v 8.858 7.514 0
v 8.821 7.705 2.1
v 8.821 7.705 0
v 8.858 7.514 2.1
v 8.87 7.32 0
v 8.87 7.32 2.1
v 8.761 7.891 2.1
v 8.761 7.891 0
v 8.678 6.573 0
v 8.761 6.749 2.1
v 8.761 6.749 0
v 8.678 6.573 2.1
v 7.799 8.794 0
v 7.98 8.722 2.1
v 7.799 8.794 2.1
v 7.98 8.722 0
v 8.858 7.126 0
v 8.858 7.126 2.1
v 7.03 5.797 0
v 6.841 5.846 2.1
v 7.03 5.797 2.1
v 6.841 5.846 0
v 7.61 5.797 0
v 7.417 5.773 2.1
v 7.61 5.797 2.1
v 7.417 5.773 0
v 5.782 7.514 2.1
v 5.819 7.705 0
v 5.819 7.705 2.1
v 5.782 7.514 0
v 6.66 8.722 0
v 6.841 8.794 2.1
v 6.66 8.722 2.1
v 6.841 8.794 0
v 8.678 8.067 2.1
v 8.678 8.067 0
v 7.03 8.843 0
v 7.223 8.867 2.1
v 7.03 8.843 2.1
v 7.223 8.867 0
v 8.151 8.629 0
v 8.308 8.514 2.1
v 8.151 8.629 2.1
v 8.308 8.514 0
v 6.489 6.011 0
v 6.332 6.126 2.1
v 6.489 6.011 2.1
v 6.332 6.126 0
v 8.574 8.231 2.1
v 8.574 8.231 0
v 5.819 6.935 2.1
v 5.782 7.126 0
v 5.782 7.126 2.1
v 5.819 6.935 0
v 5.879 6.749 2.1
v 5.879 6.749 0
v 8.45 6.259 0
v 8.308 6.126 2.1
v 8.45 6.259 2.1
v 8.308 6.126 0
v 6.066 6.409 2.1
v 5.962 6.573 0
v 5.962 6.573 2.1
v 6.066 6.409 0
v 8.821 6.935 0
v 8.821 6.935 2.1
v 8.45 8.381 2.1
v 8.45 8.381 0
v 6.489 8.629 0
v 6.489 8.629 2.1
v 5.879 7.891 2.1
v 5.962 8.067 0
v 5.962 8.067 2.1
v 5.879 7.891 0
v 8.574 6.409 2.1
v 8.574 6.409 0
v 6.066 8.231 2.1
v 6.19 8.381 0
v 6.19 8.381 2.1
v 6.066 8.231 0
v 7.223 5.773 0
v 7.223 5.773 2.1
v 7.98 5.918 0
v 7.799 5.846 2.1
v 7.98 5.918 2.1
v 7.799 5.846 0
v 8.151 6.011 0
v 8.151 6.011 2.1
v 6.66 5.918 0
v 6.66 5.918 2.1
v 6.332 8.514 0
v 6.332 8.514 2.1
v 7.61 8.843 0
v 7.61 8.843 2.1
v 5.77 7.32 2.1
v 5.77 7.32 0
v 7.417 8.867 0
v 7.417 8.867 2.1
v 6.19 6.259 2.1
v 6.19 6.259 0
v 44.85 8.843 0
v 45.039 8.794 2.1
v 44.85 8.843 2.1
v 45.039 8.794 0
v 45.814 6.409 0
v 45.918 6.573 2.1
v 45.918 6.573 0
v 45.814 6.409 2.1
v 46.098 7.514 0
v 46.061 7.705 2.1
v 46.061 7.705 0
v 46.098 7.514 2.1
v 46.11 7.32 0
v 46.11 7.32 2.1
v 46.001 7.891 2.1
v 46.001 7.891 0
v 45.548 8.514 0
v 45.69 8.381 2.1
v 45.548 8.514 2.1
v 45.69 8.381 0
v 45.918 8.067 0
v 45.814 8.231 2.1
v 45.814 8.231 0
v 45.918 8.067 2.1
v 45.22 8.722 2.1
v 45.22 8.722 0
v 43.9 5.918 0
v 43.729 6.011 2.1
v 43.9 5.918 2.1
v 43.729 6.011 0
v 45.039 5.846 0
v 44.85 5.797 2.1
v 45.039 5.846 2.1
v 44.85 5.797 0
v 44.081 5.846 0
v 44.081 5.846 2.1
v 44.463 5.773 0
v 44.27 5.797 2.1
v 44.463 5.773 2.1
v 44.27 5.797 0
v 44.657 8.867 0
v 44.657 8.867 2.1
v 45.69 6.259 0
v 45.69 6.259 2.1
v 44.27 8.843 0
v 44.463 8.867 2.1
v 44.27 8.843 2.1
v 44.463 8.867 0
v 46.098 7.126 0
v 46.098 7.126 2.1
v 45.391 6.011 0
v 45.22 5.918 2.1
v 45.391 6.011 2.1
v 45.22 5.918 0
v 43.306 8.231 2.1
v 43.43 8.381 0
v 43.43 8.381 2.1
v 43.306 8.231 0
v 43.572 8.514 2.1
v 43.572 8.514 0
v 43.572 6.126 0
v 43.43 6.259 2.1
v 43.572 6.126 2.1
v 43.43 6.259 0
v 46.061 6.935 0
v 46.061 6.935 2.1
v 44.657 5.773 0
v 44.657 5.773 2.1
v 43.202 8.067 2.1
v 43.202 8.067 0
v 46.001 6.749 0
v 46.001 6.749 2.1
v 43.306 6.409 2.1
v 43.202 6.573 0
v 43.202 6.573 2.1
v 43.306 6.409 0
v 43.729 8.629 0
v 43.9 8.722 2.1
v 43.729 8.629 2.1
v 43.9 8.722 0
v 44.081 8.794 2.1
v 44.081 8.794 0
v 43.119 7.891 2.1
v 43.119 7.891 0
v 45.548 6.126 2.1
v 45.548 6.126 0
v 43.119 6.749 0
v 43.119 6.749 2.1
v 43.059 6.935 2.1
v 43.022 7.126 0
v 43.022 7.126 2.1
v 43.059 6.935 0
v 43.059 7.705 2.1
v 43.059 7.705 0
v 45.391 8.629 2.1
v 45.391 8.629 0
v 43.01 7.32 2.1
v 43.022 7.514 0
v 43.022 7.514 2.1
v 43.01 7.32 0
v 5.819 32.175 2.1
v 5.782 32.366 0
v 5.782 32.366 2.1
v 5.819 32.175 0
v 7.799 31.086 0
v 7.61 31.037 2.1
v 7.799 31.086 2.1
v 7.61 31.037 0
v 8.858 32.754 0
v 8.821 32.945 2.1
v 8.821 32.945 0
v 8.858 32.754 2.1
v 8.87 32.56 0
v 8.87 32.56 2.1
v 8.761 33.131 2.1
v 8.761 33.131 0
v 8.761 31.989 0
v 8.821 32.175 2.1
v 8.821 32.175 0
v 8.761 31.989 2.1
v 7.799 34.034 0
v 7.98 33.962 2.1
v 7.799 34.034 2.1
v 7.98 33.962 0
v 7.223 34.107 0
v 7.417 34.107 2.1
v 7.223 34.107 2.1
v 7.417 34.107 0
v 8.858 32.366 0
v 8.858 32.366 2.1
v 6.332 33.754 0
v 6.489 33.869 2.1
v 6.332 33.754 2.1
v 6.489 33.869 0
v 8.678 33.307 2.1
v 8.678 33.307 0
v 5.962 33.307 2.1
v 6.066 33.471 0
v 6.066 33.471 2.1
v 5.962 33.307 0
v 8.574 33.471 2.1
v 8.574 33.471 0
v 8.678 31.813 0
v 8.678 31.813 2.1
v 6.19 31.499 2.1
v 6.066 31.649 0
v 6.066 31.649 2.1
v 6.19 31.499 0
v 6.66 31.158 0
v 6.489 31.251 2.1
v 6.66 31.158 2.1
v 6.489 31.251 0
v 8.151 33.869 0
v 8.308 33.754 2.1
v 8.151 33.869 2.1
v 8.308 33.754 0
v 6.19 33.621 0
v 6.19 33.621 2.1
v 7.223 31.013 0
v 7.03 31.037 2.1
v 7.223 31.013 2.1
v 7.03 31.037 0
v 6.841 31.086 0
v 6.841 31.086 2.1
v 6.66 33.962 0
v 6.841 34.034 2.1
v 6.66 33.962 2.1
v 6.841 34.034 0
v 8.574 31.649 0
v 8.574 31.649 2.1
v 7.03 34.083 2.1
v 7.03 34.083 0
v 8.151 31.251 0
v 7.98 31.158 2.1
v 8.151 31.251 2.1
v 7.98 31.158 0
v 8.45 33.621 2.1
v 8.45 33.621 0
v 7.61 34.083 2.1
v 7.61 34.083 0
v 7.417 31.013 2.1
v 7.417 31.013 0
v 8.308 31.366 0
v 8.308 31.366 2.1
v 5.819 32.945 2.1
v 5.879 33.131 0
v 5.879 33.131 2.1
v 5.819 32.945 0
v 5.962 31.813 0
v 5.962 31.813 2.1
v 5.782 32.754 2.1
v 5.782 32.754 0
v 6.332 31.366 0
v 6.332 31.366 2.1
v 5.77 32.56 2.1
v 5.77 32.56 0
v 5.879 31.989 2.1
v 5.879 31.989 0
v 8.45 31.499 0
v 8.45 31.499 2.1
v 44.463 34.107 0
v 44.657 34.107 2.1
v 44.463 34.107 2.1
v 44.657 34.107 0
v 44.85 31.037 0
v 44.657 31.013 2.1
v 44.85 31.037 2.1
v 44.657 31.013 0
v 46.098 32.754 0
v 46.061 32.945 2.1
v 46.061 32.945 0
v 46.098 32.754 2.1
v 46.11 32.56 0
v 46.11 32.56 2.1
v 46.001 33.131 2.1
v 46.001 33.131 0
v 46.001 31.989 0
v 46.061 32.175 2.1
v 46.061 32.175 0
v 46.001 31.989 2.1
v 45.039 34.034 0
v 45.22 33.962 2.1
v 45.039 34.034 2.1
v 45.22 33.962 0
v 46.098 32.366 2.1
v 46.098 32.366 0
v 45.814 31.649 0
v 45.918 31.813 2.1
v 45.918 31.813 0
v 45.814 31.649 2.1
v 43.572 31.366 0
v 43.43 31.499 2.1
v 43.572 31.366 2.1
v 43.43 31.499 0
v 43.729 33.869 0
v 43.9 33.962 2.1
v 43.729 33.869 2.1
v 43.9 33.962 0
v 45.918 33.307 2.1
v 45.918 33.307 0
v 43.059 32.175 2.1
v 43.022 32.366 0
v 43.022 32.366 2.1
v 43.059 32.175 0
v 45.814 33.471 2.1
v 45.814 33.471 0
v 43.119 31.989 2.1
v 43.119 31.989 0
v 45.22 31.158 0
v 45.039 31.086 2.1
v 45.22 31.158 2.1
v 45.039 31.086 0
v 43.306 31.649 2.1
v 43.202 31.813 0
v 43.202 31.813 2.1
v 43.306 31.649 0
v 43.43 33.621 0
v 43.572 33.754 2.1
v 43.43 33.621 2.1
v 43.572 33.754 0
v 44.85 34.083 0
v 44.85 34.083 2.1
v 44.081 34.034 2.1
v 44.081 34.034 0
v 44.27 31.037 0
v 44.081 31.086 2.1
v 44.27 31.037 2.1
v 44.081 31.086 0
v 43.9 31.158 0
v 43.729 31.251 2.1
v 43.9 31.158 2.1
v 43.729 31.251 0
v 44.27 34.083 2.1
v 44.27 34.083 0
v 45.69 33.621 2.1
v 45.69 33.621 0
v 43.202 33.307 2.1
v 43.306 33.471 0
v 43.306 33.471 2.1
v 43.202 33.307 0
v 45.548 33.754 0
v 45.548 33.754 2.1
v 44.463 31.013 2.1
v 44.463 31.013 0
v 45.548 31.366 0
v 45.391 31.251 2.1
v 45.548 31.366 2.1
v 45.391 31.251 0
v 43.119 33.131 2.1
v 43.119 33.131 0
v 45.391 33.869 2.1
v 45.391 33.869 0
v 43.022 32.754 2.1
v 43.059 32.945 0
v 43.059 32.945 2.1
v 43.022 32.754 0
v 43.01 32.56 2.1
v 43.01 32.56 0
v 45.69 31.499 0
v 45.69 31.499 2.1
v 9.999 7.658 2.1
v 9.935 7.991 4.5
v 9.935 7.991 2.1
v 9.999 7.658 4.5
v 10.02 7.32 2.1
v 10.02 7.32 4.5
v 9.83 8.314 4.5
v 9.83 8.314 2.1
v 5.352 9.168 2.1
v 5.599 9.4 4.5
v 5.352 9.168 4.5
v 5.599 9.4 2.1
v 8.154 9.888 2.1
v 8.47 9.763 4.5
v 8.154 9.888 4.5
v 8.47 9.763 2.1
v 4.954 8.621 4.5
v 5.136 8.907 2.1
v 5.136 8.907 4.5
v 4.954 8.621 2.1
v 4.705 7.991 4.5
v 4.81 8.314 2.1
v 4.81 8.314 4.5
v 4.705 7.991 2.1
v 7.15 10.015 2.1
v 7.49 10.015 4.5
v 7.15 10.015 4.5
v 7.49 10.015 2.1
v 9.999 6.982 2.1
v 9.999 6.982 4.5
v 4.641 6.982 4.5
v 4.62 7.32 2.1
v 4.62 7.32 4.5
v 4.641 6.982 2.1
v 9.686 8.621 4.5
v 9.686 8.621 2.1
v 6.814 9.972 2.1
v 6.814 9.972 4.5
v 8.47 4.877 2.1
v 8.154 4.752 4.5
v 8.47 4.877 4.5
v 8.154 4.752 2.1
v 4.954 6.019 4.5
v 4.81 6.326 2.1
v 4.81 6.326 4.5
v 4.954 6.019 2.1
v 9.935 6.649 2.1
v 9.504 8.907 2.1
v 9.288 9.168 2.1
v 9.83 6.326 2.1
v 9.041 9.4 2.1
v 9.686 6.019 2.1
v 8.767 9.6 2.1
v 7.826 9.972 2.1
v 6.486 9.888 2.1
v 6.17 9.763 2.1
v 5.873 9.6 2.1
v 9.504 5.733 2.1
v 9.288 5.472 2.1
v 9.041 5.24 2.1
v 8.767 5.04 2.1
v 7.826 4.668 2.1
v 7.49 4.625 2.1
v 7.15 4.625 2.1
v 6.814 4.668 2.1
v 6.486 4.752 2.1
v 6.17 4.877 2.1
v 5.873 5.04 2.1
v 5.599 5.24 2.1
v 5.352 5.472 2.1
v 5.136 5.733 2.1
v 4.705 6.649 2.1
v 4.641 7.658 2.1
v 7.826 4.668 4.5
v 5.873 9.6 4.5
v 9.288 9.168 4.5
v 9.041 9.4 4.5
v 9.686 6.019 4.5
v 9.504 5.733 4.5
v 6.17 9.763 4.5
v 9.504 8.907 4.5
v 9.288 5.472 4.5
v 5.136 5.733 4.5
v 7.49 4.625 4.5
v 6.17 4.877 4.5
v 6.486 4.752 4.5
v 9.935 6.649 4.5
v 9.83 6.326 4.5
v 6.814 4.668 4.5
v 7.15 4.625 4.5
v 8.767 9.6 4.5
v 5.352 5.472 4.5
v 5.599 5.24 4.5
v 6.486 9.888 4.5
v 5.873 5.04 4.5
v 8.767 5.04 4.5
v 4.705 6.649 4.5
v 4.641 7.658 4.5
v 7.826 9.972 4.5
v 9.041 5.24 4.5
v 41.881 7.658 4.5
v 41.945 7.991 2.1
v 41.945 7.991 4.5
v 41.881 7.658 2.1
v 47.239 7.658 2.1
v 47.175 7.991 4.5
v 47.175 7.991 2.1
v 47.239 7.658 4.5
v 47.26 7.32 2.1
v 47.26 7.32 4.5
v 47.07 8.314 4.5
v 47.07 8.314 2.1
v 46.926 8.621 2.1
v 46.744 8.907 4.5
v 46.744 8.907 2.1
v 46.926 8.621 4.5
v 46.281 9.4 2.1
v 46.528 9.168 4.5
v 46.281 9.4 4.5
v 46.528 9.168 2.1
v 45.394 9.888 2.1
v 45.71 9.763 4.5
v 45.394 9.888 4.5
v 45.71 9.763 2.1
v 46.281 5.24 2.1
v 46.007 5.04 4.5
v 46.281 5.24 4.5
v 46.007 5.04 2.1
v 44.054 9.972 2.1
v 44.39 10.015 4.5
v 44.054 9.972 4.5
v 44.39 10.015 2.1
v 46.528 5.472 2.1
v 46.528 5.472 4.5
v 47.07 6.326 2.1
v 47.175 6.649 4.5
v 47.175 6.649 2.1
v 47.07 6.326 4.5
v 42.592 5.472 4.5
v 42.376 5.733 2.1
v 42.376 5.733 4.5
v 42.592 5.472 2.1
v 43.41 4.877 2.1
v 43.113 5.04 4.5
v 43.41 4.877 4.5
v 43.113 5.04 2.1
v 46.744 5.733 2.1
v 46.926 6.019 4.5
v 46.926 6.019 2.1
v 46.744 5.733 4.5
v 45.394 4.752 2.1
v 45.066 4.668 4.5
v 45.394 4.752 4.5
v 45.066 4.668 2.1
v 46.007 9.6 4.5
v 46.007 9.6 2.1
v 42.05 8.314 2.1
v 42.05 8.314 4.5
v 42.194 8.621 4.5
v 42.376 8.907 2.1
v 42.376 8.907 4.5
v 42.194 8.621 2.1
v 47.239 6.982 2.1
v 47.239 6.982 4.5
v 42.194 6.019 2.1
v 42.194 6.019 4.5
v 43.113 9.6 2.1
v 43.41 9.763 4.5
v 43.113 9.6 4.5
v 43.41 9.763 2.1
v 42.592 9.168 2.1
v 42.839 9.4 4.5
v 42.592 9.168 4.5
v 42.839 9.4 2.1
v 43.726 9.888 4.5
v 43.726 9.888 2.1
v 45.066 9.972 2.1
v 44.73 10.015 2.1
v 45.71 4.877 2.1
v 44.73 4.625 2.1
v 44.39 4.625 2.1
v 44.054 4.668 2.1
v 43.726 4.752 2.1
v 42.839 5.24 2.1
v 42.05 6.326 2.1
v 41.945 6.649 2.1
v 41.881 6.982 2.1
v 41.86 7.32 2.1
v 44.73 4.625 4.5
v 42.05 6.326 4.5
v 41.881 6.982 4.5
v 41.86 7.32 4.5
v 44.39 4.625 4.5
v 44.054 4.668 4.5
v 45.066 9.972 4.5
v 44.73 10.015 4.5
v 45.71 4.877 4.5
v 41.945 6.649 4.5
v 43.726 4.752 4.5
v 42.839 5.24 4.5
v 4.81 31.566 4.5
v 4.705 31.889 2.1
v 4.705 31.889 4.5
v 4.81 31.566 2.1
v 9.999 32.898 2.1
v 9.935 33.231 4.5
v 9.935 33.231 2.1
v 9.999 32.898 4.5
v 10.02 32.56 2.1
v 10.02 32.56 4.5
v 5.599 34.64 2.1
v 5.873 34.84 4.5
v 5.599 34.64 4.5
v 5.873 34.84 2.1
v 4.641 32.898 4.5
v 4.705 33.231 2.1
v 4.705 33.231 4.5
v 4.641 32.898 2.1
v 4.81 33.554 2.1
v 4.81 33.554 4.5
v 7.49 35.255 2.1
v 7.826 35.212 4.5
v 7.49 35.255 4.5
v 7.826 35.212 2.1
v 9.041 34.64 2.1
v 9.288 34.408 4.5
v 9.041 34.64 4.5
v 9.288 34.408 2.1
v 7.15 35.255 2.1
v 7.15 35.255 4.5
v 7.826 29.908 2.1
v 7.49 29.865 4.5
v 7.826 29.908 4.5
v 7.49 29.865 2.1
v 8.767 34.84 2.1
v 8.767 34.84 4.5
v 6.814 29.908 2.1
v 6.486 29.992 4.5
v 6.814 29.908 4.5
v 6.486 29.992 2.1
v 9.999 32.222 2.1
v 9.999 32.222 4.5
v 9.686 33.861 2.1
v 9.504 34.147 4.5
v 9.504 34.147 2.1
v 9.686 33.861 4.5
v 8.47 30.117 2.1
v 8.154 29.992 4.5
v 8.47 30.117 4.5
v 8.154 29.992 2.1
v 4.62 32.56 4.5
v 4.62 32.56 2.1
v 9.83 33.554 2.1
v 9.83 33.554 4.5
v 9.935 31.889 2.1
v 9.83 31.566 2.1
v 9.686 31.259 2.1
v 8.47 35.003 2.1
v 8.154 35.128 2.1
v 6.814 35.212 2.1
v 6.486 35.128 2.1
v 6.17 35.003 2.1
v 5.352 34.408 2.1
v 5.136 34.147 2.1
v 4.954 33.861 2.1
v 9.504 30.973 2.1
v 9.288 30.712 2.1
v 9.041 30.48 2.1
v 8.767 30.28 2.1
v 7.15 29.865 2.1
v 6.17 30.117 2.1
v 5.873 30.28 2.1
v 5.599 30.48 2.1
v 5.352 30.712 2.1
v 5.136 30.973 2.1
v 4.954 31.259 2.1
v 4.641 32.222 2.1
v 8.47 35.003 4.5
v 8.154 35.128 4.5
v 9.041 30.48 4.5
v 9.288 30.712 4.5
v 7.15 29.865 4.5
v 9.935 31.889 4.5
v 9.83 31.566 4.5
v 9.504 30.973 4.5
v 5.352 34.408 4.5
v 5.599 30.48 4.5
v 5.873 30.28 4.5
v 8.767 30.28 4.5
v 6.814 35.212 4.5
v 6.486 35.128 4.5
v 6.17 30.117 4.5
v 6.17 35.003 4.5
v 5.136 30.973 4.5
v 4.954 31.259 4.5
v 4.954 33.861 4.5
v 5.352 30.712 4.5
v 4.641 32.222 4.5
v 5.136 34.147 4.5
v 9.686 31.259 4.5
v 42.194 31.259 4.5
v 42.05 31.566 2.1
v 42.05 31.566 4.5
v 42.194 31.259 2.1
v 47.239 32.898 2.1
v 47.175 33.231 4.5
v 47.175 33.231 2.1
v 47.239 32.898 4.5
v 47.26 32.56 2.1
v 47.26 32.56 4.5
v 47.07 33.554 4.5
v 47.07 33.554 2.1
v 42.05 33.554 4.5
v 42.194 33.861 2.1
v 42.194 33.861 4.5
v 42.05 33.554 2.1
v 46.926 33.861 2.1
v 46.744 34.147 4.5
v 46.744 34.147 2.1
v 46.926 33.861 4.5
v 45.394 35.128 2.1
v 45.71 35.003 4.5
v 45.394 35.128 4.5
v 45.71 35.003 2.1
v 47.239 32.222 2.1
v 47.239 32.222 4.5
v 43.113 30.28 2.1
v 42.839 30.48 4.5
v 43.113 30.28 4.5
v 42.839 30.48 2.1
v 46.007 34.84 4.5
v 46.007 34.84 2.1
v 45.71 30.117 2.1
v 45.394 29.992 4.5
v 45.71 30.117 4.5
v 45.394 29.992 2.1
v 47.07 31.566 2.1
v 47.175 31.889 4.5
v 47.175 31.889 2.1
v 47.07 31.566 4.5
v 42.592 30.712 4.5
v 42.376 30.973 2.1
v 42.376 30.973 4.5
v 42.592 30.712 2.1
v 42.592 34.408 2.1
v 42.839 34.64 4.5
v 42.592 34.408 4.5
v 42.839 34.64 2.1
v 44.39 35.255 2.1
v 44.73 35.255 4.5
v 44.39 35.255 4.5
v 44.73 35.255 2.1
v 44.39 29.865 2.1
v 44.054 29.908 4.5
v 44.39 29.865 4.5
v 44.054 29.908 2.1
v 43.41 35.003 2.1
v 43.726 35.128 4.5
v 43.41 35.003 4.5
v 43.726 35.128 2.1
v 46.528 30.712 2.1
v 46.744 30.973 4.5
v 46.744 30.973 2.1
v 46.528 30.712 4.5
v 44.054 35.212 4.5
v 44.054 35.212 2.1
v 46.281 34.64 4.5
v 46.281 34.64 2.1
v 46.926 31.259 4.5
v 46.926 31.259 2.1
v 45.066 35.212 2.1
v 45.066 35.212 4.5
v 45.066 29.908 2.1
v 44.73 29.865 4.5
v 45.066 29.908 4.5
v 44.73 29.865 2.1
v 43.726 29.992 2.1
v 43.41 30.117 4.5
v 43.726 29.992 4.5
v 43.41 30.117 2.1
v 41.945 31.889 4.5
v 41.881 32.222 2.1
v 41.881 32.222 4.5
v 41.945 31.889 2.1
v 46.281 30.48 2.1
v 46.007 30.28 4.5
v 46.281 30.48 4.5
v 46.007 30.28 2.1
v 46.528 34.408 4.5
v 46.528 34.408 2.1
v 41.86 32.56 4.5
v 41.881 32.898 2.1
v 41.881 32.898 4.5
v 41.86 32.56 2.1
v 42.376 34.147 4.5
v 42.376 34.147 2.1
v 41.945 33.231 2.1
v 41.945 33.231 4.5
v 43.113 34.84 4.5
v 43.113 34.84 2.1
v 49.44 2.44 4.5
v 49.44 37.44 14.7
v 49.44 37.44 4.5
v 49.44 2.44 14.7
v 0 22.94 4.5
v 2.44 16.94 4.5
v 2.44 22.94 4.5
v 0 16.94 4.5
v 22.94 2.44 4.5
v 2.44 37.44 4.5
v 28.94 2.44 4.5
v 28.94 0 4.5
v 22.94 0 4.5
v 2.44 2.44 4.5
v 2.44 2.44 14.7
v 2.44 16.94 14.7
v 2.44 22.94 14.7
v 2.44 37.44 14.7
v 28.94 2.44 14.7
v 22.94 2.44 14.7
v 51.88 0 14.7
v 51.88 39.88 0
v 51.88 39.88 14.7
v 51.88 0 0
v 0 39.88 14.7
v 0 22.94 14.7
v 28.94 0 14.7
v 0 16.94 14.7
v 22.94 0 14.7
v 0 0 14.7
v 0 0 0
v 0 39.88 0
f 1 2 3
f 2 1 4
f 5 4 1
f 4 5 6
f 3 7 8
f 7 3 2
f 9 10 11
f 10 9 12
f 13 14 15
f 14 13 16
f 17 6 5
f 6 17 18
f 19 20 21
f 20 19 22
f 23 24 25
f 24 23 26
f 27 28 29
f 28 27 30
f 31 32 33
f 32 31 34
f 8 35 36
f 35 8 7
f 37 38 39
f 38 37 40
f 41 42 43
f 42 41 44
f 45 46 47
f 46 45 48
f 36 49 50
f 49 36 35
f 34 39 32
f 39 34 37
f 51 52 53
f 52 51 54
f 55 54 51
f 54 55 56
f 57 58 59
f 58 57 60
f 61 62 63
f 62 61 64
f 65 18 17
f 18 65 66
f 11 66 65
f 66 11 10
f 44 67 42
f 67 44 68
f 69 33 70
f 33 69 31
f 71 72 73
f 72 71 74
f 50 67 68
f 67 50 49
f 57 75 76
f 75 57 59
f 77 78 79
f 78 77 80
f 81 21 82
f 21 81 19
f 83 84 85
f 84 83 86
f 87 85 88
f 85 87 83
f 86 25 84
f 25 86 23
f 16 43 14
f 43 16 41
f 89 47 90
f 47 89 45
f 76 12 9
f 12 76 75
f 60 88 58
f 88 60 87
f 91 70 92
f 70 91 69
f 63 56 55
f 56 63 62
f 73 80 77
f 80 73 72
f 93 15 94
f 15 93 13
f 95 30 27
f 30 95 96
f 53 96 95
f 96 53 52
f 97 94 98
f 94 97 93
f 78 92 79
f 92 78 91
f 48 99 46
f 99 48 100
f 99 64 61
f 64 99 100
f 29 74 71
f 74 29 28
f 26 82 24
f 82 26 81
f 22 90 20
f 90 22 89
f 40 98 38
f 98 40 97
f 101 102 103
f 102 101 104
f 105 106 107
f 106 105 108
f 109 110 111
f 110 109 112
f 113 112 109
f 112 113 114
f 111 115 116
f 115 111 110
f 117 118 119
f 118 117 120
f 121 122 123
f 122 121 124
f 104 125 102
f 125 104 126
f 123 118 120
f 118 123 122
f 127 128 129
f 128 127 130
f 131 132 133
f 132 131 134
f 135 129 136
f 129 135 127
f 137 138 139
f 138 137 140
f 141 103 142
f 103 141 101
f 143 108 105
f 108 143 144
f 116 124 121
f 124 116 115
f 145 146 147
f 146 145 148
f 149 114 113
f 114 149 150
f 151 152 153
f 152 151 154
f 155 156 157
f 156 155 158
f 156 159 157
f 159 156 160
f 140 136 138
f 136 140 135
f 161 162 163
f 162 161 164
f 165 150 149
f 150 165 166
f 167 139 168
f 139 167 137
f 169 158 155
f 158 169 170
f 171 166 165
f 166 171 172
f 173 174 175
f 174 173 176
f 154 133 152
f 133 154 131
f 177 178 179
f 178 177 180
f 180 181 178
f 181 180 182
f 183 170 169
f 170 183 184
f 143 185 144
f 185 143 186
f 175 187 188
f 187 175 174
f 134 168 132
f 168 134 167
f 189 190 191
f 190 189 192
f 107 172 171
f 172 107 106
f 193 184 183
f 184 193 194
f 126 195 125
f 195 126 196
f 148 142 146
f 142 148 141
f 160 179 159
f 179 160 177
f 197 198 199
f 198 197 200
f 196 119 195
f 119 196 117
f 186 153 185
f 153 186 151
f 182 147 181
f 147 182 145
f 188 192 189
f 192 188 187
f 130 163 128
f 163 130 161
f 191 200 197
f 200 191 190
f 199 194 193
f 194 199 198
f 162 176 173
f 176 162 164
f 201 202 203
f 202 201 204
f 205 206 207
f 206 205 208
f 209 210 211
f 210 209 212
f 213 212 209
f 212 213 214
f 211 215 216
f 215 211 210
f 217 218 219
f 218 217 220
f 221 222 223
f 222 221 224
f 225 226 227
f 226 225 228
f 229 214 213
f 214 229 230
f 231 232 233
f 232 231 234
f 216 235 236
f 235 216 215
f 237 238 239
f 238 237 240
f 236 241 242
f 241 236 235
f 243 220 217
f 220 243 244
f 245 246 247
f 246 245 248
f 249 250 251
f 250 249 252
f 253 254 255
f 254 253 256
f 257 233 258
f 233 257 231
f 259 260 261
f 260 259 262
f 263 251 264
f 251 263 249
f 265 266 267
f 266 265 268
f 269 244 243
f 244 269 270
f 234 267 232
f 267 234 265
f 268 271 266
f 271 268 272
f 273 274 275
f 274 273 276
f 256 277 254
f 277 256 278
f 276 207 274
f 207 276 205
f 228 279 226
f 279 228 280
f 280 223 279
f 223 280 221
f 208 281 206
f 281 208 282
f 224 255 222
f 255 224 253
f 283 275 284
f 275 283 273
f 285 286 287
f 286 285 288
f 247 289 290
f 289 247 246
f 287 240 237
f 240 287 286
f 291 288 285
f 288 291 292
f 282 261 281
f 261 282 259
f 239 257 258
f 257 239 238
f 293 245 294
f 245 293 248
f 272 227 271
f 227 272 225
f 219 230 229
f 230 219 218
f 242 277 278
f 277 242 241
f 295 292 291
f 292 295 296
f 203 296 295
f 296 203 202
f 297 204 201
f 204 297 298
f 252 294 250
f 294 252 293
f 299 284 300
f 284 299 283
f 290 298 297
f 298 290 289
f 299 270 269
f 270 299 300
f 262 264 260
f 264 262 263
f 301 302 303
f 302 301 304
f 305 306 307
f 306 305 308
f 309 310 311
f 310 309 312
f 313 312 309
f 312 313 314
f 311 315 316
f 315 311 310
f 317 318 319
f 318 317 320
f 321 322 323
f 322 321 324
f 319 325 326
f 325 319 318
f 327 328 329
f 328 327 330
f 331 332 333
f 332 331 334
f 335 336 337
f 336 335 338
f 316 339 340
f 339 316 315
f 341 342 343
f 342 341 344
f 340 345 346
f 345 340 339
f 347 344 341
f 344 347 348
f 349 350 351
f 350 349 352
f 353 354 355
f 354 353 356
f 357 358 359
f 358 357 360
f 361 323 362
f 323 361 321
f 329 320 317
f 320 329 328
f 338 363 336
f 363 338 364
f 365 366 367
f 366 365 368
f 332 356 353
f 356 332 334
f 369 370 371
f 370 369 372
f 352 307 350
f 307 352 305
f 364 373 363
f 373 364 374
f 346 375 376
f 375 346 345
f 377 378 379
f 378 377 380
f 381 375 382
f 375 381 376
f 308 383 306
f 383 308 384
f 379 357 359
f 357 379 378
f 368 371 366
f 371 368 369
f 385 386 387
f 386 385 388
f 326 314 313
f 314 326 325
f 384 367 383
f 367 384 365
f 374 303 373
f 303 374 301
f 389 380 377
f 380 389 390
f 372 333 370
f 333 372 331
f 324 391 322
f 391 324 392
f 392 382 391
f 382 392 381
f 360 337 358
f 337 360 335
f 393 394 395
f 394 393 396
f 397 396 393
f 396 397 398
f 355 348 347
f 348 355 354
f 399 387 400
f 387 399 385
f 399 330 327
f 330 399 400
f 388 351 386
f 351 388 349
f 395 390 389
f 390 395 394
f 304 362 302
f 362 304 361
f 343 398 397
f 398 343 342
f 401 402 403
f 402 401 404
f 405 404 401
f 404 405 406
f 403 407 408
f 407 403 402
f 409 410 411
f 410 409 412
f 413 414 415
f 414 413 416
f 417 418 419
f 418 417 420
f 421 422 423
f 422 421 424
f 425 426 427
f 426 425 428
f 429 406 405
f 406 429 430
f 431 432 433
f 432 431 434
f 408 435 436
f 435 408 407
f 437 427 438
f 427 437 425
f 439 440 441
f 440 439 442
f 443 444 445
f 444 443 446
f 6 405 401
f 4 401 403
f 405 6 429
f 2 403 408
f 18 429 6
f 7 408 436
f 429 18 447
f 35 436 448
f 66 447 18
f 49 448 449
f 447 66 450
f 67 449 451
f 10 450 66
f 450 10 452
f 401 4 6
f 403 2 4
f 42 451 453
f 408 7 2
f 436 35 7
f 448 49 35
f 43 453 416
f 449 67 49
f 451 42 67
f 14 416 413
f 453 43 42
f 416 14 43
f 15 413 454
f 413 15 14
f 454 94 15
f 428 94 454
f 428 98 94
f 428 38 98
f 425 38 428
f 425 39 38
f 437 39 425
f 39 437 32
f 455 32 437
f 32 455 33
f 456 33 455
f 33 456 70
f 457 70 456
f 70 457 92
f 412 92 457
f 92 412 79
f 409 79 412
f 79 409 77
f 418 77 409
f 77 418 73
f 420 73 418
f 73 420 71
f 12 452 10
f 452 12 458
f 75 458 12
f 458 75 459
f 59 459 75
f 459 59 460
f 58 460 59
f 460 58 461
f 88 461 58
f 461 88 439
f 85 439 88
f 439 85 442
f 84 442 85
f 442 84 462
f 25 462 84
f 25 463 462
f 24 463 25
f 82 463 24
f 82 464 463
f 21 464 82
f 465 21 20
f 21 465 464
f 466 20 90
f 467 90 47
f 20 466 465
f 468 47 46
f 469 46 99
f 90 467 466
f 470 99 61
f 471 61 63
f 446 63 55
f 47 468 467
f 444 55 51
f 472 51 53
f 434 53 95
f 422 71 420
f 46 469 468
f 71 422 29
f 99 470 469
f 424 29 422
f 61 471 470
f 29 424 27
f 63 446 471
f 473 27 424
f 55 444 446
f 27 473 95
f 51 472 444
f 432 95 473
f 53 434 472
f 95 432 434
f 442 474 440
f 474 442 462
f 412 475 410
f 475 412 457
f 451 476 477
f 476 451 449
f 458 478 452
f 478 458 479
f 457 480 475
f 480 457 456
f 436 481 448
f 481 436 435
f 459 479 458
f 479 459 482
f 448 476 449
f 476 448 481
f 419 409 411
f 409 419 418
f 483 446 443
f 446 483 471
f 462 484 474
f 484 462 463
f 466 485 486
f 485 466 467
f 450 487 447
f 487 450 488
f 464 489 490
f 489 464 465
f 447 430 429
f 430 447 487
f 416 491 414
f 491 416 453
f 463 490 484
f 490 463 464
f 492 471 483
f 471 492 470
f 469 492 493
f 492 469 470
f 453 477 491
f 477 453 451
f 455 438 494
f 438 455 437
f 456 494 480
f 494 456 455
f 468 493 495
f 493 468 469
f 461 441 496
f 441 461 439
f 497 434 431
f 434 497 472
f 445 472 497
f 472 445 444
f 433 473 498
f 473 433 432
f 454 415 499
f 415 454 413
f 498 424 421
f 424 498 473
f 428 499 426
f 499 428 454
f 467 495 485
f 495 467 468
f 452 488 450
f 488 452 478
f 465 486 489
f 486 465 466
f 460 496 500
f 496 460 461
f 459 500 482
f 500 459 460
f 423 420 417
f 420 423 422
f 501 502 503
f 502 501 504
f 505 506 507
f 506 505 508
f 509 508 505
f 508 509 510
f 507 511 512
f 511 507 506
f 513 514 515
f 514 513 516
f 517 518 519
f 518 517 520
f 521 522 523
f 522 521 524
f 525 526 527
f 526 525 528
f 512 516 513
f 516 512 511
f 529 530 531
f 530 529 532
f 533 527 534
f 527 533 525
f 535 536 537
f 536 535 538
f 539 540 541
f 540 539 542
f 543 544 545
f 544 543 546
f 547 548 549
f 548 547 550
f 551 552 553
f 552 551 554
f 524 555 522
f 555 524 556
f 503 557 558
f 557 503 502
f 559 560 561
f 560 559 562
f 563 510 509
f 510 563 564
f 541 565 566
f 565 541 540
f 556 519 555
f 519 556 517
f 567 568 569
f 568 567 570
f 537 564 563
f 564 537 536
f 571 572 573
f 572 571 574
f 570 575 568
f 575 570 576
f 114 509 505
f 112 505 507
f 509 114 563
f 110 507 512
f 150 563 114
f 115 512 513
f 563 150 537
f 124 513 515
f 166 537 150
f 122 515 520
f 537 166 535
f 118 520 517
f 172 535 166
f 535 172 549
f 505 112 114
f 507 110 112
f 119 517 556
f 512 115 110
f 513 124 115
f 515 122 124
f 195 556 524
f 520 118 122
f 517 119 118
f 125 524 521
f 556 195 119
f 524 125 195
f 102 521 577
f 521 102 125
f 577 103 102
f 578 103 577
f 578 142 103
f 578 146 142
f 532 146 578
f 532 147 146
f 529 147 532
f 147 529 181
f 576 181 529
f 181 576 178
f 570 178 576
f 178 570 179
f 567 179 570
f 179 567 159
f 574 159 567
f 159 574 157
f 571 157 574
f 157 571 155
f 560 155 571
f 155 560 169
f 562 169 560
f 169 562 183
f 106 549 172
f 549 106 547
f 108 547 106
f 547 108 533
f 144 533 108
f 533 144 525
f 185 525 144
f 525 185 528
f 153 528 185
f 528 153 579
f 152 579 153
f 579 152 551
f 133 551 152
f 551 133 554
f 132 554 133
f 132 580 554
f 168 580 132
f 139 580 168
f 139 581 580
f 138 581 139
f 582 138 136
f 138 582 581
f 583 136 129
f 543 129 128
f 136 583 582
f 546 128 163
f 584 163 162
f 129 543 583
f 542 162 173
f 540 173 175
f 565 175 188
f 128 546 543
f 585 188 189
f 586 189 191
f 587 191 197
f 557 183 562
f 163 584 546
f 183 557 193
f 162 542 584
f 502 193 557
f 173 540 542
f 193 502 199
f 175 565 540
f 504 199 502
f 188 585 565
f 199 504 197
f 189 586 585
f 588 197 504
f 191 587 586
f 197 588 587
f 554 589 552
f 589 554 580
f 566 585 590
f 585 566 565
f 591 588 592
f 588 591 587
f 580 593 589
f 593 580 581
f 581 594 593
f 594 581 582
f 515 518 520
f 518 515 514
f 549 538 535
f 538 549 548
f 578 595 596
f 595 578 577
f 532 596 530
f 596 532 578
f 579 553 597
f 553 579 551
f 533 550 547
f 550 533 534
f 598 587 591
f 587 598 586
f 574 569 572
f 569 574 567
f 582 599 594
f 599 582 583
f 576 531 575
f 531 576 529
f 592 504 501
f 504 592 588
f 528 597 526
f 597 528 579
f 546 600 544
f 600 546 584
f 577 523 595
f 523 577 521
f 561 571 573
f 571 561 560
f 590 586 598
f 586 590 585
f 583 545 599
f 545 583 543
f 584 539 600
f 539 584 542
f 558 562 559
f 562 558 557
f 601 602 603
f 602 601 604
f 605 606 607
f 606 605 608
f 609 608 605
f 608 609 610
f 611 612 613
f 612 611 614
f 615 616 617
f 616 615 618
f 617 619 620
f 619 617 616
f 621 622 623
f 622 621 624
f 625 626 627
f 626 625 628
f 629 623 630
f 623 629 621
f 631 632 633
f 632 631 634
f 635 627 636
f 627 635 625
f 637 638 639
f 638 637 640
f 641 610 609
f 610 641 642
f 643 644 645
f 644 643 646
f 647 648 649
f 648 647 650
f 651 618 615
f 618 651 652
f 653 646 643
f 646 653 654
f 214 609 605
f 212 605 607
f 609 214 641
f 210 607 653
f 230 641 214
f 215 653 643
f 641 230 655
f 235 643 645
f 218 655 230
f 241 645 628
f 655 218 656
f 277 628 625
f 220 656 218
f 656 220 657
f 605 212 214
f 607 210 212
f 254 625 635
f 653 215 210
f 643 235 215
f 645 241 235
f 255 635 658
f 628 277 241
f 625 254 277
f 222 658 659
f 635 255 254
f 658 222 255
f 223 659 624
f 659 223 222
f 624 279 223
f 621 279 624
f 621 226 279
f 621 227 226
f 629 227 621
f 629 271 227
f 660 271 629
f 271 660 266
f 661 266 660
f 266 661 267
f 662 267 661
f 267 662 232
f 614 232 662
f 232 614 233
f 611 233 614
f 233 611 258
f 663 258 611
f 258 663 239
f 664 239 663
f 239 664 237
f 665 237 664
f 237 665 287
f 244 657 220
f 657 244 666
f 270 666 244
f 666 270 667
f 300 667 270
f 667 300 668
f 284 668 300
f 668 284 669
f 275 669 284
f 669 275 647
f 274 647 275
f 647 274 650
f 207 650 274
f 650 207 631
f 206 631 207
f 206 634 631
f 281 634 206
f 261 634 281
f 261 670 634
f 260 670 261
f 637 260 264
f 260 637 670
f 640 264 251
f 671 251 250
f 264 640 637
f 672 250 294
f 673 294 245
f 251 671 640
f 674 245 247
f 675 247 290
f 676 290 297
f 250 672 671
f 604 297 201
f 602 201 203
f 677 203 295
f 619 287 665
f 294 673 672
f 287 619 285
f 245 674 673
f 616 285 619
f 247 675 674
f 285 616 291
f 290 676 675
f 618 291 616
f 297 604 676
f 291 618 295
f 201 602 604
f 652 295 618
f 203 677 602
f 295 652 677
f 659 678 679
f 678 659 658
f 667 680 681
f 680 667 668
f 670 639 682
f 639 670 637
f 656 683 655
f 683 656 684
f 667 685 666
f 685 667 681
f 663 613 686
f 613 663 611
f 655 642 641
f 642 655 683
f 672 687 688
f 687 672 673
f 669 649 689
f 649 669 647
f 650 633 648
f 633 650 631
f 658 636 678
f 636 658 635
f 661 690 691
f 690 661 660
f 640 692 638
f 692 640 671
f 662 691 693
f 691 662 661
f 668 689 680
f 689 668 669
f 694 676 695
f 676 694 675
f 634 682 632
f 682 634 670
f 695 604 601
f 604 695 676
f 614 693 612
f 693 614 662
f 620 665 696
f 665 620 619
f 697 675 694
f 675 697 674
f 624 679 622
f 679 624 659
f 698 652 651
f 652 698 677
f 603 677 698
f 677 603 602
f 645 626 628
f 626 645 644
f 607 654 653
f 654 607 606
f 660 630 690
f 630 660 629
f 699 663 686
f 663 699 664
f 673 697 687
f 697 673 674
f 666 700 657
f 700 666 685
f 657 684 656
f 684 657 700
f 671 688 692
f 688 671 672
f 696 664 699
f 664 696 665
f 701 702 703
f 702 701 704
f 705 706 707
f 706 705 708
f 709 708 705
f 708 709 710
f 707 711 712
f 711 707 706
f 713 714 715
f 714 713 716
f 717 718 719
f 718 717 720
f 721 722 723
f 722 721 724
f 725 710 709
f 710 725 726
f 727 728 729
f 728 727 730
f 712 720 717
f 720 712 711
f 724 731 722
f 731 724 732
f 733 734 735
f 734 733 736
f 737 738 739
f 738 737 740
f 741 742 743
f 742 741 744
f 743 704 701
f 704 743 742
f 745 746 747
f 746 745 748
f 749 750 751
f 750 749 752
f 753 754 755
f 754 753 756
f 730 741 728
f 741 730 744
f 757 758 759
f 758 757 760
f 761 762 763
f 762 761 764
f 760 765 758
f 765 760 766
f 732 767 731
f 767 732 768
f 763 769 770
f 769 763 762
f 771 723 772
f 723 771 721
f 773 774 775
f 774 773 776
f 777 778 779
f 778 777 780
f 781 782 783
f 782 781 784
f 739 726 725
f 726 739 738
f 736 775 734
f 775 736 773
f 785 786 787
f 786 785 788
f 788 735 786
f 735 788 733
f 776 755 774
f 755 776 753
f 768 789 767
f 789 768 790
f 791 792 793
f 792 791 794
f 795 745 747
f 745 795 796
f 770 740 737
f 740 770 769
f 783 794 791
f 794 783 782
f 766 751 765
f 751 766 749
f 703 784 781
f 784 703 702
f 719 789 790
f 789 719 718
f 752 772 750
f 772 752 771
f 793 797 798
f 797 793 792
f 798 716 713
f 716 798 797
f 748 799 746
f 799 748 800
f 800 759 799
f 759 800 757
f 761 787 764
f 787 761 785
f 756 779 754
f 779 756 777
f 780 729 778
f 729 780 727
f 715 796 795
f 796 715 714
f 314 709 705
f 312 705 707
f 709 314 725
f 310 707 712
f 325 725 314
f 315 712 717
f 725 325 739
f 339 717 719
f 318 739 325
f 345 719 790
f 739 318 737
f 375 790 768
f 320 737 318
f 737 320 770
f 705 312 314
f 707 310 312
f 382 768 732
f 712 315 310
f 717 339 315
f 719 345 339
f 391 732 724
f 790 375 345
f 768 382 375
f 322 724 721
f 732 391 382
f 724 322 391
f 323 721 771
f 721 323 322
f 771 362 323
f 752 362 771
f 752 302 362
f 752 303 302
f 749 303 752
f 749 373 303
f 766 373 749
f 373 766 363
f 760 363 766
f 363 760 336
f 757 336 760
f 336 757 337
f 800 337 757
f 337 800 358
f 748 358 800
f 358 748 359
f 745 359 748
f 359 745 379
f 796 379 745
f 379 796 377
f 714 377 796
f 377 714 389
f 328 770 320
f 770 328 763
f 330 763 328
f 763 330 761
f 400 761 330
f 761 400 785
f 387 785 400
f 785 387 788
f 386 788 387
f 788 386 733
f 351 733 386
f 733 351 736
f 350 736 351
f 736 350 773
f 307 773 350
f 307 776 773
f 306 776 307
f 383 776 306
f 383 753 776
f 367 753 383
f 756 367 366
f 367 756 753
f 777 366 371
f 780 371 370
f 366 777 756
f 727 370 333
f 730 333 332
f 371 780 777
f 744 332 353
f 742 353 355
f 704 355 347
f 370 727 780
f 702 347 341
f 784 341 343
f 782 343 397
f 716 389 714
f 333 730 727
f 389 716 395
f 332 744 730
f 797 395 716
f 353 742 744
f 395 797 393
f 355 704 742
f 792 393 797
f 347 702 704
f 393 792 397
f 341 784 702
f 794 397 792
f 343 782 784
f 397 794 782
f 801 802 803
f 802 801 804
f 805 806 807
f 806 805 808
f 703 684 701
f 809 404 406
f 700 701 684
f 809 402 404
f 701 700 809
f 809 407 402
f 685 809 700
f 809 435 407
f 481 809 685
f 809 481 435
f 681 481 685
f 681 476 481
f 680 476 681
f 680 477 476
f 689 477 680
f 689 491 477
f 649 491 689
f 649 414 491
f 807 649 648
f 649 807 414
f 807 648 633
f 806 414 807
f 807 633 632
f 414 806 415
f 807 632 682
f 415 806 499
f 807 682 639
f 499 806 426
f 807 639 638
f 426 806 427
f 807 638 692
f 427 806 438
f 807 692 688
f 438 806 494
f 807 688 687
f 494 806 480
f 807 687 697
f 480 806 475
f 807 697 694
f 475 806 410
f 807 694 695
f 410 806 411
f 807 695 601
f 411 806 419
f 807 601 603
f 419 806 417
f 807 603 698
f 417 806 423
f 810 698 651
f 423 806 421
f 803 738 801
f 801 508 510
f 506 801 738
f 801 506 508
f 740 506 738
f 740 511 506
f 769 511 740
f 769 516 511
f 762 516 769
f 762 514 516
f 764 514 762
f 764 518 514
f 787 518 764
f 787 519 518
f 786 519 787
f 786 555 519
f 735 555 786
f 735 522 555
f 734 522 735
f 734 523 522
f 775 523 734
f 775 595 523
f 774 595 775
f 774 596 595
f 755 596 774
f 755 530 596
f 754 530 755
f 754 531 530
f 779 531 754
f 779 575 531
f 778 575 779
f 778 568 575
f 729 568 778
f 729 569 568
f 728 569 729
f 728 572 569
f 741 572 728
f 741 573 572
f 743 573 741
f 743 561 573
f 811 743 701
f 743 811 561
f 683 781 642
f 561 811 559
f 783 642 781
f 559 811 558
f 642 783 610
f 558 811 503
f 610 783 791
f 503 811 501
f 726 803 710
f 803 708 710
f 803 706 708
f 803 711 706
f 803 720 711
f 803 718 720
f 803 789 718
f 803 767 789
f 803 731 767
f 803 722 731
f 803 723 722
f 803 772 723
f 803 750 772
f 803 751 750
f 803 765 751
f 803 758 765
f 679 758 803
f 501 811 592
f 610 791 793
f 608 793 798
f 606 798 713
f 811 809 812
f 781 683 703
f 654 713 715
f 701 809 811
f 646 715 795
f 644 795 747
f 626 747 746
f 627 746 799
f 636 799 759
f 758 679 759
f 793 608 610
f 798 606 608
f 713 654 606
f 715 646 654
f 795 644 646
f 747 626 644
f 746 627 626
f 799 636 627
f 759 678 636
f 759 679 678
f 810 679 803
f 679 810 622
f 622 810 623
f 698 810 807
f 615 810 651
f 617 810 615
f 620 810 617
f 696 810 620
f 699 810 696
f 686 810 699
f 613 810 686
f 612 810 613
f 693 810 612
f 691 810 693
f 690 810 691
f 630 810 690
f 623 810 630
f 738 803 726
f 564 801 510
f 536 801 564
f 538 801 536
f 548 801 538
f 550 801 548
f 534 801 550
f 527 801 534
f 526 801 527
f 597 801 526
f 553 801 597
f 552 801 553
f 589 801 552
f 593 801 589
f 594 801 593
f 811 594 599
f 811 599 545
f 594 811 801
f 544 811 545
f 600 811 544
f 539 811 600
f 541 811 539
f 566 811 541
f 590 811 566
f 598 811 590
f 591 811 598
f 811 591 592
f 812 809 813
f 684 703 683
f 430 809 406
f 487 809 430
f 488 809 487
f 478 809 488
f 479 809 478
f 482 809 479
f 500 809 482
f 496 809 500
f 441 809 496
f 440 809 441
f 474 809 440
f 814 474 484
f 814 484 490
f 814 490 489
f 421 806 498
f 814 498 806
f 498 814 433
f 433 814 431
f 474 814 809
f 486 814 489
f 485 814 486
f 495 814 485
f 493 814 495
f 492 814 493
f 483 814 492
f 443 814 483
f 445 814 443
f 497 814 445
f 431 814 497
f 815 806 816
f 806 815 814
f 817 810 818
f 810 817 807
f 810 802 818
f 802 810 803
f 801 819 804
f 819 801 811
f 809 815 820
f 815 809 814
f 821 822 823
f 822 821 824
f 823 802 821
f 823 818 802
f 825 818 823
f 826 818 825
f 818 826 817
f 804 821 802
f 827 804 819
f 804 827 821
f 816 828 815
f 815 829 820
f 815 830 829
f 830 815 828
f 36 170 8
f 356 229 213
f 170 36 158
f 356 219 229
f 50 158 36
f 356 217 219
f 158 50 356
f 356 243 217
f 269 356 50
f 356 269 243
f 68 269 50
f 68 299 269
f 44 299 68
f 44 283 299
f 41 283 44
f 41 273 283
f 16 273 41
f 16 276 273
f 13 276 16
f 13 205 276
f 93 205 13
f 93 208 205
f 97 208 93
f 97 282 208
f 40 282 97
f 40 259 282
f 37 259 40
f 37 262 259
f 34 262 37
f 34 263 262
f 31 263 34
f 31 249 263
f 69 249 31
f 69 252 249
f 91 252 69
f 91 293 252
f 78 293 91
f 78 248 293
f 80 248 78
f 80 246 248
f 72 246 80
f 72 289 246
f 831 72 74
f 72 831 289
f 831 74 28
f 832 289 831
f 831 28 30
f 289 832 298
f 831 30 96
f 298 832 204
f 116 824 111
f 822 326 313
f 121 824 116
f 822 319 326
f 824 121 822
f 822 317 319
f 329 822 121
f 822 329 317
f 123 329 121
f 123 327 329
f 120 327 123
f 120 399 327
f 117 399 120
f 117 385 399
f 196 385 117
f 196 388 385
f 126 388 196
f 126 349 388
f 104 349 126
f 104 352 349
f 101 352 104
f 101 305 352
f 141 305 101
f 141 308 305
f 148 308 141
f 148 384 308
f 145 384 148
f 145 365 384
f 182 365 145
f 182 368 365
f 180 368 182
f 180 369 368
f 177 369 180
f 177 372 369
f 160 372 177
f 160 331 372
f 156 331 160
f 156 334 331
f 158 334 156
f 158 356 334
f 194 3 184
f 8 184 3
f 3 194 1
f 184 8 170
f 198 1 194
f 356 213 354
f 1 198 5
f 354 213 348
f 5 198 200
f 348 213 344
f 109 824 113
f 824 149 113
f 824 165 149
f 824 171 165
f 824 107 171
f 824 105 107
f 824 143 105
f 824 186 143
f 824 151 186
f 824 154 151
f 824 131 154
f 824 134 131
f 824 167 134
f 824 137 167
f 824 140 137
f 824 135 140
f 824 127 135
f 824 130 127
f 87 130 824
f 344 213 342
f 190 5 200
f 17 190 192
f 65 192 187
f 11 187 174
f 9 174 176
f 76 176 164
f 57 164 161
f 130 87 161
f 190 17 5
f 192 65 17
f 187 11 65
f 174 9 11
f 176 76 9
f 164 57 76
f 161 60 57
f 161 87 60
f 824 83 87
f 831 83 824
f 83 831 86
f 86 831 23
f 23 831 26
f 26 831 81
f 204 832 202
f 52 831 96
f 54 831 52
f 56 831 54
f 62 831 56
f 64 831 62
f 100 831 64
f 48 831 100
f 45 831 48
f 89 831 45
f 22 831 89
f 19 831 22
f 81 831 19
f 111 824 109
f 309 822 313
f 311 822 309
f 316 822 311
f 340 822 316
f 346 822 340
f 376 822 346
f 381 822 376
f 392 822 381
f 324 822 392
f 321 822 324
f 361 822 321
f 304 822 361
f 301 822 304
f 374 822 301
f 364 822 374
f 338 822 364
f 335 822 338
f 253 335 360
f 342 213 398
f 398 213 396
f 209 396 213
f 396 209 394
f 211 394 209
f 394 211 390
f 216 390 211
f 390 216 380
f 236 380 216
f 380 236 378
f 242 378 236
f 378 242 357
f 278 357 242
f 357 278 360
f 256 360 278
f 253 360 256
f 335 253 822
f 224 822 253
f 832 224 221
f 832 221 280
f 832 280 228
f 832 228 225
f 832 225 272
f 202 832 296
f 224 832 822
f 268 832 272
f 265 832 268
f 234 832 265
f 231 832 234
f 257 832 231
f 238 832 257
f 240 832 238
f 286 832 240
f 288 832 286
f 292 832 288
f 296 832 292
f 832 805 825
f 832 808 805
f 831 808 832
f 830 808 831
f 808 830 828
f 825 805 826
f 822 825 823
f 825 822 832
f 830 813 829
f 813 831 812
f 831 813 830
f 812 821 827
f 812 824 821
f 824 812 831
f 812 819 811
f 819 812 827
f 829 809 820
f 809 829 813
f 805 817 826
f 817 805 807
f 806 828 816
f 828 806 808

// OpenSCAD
// file: ../modules/enclosure_box.scad
// ----------------------------------------------------------------------------------
include<printer_limits.scad>
// ----------------------------------------------------------------------------------
function enclosure_close_box_lid_rotate_ang(draw_as_close_box=false) =
  (draw_as_close_box) ?
    ([0, 180, 0])
  : ([0, 0, 0]);

function enclosure_close_box_lid_translate_xyz(draw_as_close_box=false, length=50, width=40, height=15, xy_wall_width=ptr_wall_width, z_wall_width=z_dim_adj(1), tolerance=ptr_tolerance) =
  (draw_as_close_box) ?
    ([-length-2*xy_wall_width, 0, -2*z_wall_width-height-tolerance])
  : ([0, -width-4*xy_wall_width, 0]);

// ----------------------------------------------------------------------------------
module enclosure_box(
  length=50,
  width=40,
  height=15,
  lid_height=5,
  xy_wall_width=ptr_wall_width,
  z_wall_width=z_dim_adj(1),
  fitted_lid=true,
  draw_lid=false,
  draw_container=false,
  xy_screws=false,
  xy_screws_hide=false,
  bottom_connectors=false,
  tolerance=0.0
)
{
  echo("+Enclosure box");
  
  // Bottom
  if(draw_container) {
    difference() {
      cube([length+2*xy_wall_width, width+2*xy_wall_width, height+z_wall_width]);
      union() {
        difference() {
          translate([xy_wall_width, xy_wall_width, z_wall_width])
            cube([length, width, height+z_wall_width]);
            if(xy_screws_hide && xy_screws_hide[1]>0)
              for(xy = xy_screws[1]) {
                translate([xy[0], xy[1], xy_screws_hide[1]/2+z_wall_width])
                  cube([xy_screws_hide[0]+2*xy_wall_width, xy_screws_hide[0]+2*xy_wall_width, xy_screws_hide[1]], center=true);
              }
        }
        if(xy_screws) {
          for(xy = xy_screws[1]) {
            translate([xy[0], xy[1], 0])
              cylinder(h=3*z_wall_width, d=xy_screws[0], $fn=50, center=true);
          }
        }
        if(xy_screws_hide) {
          h = abs(xy_screws_hide[1])+2*z_wall_width;
          offset = (xy_screws_hide[1] < 0) ? (h/2 + z_wall_width + xy_screws_hide[1]) : (xy_screws_hide[1]/2+2*z_wall_width);
          for(xy = xy_screws[1]) {
            translate([xy[0], xy[1], offset])
              cylinder(h=h, d=xy_screws_hide[0], $fn=50, center=true);
          }
        }
        if(bottom_connectors) {
          for(xy = xy_screws[1]) {
            translate([xy[0], xy[1], 0])
              cylinder(h=3*z_wall_width, d=xy_screws[0], $fn=50, center=true);
          }
        }
      }
    }
  }
  
  // Lid
  if(draw_lid) {
    difference() {
      if(fitted_lid) {
        cube([length+2*xy_wall_width, width+2*xy_wall_width, lid_height+z_wall_width]);
      }
      else {
        translate([-xy_wall_width, -xy_wall_width, 0])
          cube([length+4*xy_wall_width, width+4*xy_wall_width, lid_height+z_wall_width]);
      }
      
      if(fitted_lid) {
        difference() {
          translate([-xy_wall_width, -xy_wall_width, z_wall_width])
            cube([length+4*xy_wall_width, width+4*xy_wall_width, lid_height+2*z_wall_width]);
          translate([xy_wall_width, xy_wall_width, z_wall_width])
            cube([length, width, height+z_wall_width]);
      }
      translate([2*xy_wall_width, 2*xy_wall_width, z_wall_width])
        cube([length-2*xy_wall_width, width-2*xy_wall_width, height+z_wall_width]);
      }
      else {
        translate([0, 0, z_wall_width])
          cube([length+2*xy_wall_width, width+2*xy_wall_width, lid_height+2*z_wall_width]);
      }
    }
  }
}
// ----------------------------------------------------------------------------------
if(false) {
  enclosure_box(draw_container=true);
  rotate(enclosure_close_box_lid_rotate_ang(false))
    translate(enclosure_close_box_lid_translate_xyz(false))
      enclosure_box(draw_lid=true, fitted_lid=true);
}
// ----------------------------------------------------------------------------------
// file: ../modules/printer_limits.scad
// ----------------------------------------------------------------------------------
// TODO: add function to get match wall_width
// ----------------------------------------------------------------------------------
first_layer_height = 0.3;
min_layer_height = 0.3;
layer_height = 0.6;

ptr_top_wall_width = 2*layer_height;
ptr_tolerance = min_layer_height/2;
// ----------------------------------------------------------------------------------
// lines: width (mm)
ptr_2lines = 1.67;
ptr_3lines = 2.44;
ptr_4lines = 3.21;
ptr_5lines = 3.98;
ptr_6lines = 4.76;

ptr_smallest_wall_width = ptr_2lines;
ptr_wall_width = ptr_3lines;
// ----------------------------------------------------------------------------------
min_x = 8;
max_x = 223;
min_y = 2;
max_y = 207;
max_z = 230;
// ----------------------------------------------------------------------------------
// LxW
max_printable_length = max(max_x-min_x, max_y-min_y);
max_printable_width = min(max_x-min_x, max_y-min_y);
// ----------------------------------------------------------------------------------
function xy_dim_adj(x) = ceil(x/ptr_smallest_wall_width)*ptr_smallest_wall_width;
function  z_dim_adj(z) = ceil((z-first_layer_height)/min_layer_height)*min_layer_height + first_layer_height;
function xy_wall_width_adj(x) =
    (x <= ptr_2lines) ? (ptr_2lines) :
    (x <= ptr_3lines) ? (ptr_3lines) :
    (x <= ptr_4lines) ? (ptr_4lines) :
    (x <= ptr_5lines) ? (ptr_5lines) :
    (x <= ptr_6lines) ? (ptr_6lines) :
    (ptr_6lines);
    
// ----------------------------------------------------------------------------------
// screws diameters with tolerances
// https://www.engineersedge.com/hardware/standard_metric_hex_nuts_13728.htm
xy_tolerance = 0.1;
z_tolerance = min_layer_height;

// M3
xy_screw_3mm_d      = 3 + xy_tolerance;
xy_screw_3mm_hd_d   = 5.3 + xy_tolerance;
xy_screw_3mm_hd_h   = z_dim_adj(2.1 + xy_tolerance);
xy_screw_3mm_nut_d  = 5.50+z_tolerance;
xy_screw_3mm_nut_dd = 6.35+z_tolerance;
xy_screw_3mm_nut_h  = z_dim_adj(2.55+z_tolerance);

z_screw_3mm_d      = z_dim_adj(3+z_tolerance);
z_screw_3mm_nut_d  = z_dim_adj(5.50+z_tolerance);
z_screw_3mm_nut_dd = z_dim_adj(6.35+z_tolerance);
z_screw_3mm_nut_h  = z_dim_adj(2.55+z_tolerance);

// M4
xy_screw_4mm_d      = 4 + xy_tolerance;
xy_screw_4mm_nut_d  = 7.00+z_tolerance;
xy_screw_4mm_nut_dd = 8.08+z_tolerance;
xy_screw_4mm_nut_h  = 3.20+z_tolerance;

z_screw_4mm_d      = z_dim_adj(4+z_tolerance);
z_screw_4mm_nut_d  = z_dim_adj(7.00+z_tolerance);
z_screw_4mm_nut_dd = z_dim_adj(8.08+z_tolerance);
z_screw_4mm_nut_h  = z_dim_adj(3.20+z_tolerance);

// M5
xy_screw_5mm_d = 5 + xy_tolerance;
z_screw_5mm_d  = z_dim_adj(5+z_tolerance);
//z_screw_5mm_nut_d  = z_dim_adj(5.50+z_tolerance);
//z_screw_5mm_nut_dd = z_dim_adj(6.35+z_tolerance);
//z_screw_5mm_nut_h  = z_dim_adj(2.55+z_tolerance);
// main file
// ----------------------------------------------------------------------------------
// Print settings:
// - Infill: 15% (or less if bridges OK)
// ----------------------------------------------------------------------------------
include<../modules/printer_limits.scad>
use<../modules/enclosure_box.scad>
// ----------------------------------------------------------------------------------
// DIMENSIONS
ttgo_wall_width = ptr_wall_width;
ttgo_bottom_wall_width = z_dim_adj(2+xy_screw_3mm_hd_h);

ttgo_l = 47;
ttgo_w = 35;
ttgo_h = z_dim_adj(10) ;
ttgo_board_bt_clearence = z_dim_adj(0);

// ------------------------------------------
// Screws
ttgo_screws_xy = [
  [            3*ttgo_wall_width, 3*ttgo_wall_width],
  [ttgo_l - 1*ttgo_wall_width, 3*ttgo_wall_width],
  [            3*ttgo_wall_width, ttgo_w-1*ttgo_wall_width],
  [ttgo_l - 1*ttgo_wall_width, ttgo_w-1*ttgo_wall_width]
];

module ttgo_enclosure(
  fitted_lid=true,
  draw_lid=false,
  draw_container=false,
  draw_as_close_box=false
)
{
  echo("----------------------------------------------------------------------------------------------------------------------------------------------------");
  echo("ttgo-t1 Enclosure");
  if(draw_container || draw_as_close_box ) {
    difference() {
      enclosure_box(
        length=ttgo_l, width=ttgo_w, height=ttgo_h, lid_height=0,
        xy_wall_width=ttgo_wall_width, z_wall_width=ttgo_bottom_wall_width,
        fitted_lid=fitted_lid, draw_container=true,
        xy_screws=[xy_screw_3mm_d, ttgo_screws_xy],
        xy_screws_hide=[xy_screw_3mm_hd_d, -xy_screw_3mm_hd_h],
        tolerance=ptr_tolerance
      );
      translate([ttgo_l/2-3+ttgo_wall_width, -ttgo_wall_width, ttgo_bottom_wall_width+ttgo_board_bt_clearence])
        cube([6, 3*ttgo_wall_width, ttgo_h+ttgo_bottom_wall_width]);
      
      translate([-ttgo_wall_width, ttgo_w/2-3+ttgo_wall_width, ttgo_bottom_wall_width+ttgo_board_bt_clearence])
        cube([3*ttgo_wall_width, 6, ttgo_h+ttgo_bottom_wall_width]);
    }
  }
}

difference() {
  *ttgo_enclosure(draw_as_close_box=true);
  ttgo_enclosure(draw_container=true);
  *translate([ttgo_enclosure_l/2, -10, -10])
    cube(500);
}
